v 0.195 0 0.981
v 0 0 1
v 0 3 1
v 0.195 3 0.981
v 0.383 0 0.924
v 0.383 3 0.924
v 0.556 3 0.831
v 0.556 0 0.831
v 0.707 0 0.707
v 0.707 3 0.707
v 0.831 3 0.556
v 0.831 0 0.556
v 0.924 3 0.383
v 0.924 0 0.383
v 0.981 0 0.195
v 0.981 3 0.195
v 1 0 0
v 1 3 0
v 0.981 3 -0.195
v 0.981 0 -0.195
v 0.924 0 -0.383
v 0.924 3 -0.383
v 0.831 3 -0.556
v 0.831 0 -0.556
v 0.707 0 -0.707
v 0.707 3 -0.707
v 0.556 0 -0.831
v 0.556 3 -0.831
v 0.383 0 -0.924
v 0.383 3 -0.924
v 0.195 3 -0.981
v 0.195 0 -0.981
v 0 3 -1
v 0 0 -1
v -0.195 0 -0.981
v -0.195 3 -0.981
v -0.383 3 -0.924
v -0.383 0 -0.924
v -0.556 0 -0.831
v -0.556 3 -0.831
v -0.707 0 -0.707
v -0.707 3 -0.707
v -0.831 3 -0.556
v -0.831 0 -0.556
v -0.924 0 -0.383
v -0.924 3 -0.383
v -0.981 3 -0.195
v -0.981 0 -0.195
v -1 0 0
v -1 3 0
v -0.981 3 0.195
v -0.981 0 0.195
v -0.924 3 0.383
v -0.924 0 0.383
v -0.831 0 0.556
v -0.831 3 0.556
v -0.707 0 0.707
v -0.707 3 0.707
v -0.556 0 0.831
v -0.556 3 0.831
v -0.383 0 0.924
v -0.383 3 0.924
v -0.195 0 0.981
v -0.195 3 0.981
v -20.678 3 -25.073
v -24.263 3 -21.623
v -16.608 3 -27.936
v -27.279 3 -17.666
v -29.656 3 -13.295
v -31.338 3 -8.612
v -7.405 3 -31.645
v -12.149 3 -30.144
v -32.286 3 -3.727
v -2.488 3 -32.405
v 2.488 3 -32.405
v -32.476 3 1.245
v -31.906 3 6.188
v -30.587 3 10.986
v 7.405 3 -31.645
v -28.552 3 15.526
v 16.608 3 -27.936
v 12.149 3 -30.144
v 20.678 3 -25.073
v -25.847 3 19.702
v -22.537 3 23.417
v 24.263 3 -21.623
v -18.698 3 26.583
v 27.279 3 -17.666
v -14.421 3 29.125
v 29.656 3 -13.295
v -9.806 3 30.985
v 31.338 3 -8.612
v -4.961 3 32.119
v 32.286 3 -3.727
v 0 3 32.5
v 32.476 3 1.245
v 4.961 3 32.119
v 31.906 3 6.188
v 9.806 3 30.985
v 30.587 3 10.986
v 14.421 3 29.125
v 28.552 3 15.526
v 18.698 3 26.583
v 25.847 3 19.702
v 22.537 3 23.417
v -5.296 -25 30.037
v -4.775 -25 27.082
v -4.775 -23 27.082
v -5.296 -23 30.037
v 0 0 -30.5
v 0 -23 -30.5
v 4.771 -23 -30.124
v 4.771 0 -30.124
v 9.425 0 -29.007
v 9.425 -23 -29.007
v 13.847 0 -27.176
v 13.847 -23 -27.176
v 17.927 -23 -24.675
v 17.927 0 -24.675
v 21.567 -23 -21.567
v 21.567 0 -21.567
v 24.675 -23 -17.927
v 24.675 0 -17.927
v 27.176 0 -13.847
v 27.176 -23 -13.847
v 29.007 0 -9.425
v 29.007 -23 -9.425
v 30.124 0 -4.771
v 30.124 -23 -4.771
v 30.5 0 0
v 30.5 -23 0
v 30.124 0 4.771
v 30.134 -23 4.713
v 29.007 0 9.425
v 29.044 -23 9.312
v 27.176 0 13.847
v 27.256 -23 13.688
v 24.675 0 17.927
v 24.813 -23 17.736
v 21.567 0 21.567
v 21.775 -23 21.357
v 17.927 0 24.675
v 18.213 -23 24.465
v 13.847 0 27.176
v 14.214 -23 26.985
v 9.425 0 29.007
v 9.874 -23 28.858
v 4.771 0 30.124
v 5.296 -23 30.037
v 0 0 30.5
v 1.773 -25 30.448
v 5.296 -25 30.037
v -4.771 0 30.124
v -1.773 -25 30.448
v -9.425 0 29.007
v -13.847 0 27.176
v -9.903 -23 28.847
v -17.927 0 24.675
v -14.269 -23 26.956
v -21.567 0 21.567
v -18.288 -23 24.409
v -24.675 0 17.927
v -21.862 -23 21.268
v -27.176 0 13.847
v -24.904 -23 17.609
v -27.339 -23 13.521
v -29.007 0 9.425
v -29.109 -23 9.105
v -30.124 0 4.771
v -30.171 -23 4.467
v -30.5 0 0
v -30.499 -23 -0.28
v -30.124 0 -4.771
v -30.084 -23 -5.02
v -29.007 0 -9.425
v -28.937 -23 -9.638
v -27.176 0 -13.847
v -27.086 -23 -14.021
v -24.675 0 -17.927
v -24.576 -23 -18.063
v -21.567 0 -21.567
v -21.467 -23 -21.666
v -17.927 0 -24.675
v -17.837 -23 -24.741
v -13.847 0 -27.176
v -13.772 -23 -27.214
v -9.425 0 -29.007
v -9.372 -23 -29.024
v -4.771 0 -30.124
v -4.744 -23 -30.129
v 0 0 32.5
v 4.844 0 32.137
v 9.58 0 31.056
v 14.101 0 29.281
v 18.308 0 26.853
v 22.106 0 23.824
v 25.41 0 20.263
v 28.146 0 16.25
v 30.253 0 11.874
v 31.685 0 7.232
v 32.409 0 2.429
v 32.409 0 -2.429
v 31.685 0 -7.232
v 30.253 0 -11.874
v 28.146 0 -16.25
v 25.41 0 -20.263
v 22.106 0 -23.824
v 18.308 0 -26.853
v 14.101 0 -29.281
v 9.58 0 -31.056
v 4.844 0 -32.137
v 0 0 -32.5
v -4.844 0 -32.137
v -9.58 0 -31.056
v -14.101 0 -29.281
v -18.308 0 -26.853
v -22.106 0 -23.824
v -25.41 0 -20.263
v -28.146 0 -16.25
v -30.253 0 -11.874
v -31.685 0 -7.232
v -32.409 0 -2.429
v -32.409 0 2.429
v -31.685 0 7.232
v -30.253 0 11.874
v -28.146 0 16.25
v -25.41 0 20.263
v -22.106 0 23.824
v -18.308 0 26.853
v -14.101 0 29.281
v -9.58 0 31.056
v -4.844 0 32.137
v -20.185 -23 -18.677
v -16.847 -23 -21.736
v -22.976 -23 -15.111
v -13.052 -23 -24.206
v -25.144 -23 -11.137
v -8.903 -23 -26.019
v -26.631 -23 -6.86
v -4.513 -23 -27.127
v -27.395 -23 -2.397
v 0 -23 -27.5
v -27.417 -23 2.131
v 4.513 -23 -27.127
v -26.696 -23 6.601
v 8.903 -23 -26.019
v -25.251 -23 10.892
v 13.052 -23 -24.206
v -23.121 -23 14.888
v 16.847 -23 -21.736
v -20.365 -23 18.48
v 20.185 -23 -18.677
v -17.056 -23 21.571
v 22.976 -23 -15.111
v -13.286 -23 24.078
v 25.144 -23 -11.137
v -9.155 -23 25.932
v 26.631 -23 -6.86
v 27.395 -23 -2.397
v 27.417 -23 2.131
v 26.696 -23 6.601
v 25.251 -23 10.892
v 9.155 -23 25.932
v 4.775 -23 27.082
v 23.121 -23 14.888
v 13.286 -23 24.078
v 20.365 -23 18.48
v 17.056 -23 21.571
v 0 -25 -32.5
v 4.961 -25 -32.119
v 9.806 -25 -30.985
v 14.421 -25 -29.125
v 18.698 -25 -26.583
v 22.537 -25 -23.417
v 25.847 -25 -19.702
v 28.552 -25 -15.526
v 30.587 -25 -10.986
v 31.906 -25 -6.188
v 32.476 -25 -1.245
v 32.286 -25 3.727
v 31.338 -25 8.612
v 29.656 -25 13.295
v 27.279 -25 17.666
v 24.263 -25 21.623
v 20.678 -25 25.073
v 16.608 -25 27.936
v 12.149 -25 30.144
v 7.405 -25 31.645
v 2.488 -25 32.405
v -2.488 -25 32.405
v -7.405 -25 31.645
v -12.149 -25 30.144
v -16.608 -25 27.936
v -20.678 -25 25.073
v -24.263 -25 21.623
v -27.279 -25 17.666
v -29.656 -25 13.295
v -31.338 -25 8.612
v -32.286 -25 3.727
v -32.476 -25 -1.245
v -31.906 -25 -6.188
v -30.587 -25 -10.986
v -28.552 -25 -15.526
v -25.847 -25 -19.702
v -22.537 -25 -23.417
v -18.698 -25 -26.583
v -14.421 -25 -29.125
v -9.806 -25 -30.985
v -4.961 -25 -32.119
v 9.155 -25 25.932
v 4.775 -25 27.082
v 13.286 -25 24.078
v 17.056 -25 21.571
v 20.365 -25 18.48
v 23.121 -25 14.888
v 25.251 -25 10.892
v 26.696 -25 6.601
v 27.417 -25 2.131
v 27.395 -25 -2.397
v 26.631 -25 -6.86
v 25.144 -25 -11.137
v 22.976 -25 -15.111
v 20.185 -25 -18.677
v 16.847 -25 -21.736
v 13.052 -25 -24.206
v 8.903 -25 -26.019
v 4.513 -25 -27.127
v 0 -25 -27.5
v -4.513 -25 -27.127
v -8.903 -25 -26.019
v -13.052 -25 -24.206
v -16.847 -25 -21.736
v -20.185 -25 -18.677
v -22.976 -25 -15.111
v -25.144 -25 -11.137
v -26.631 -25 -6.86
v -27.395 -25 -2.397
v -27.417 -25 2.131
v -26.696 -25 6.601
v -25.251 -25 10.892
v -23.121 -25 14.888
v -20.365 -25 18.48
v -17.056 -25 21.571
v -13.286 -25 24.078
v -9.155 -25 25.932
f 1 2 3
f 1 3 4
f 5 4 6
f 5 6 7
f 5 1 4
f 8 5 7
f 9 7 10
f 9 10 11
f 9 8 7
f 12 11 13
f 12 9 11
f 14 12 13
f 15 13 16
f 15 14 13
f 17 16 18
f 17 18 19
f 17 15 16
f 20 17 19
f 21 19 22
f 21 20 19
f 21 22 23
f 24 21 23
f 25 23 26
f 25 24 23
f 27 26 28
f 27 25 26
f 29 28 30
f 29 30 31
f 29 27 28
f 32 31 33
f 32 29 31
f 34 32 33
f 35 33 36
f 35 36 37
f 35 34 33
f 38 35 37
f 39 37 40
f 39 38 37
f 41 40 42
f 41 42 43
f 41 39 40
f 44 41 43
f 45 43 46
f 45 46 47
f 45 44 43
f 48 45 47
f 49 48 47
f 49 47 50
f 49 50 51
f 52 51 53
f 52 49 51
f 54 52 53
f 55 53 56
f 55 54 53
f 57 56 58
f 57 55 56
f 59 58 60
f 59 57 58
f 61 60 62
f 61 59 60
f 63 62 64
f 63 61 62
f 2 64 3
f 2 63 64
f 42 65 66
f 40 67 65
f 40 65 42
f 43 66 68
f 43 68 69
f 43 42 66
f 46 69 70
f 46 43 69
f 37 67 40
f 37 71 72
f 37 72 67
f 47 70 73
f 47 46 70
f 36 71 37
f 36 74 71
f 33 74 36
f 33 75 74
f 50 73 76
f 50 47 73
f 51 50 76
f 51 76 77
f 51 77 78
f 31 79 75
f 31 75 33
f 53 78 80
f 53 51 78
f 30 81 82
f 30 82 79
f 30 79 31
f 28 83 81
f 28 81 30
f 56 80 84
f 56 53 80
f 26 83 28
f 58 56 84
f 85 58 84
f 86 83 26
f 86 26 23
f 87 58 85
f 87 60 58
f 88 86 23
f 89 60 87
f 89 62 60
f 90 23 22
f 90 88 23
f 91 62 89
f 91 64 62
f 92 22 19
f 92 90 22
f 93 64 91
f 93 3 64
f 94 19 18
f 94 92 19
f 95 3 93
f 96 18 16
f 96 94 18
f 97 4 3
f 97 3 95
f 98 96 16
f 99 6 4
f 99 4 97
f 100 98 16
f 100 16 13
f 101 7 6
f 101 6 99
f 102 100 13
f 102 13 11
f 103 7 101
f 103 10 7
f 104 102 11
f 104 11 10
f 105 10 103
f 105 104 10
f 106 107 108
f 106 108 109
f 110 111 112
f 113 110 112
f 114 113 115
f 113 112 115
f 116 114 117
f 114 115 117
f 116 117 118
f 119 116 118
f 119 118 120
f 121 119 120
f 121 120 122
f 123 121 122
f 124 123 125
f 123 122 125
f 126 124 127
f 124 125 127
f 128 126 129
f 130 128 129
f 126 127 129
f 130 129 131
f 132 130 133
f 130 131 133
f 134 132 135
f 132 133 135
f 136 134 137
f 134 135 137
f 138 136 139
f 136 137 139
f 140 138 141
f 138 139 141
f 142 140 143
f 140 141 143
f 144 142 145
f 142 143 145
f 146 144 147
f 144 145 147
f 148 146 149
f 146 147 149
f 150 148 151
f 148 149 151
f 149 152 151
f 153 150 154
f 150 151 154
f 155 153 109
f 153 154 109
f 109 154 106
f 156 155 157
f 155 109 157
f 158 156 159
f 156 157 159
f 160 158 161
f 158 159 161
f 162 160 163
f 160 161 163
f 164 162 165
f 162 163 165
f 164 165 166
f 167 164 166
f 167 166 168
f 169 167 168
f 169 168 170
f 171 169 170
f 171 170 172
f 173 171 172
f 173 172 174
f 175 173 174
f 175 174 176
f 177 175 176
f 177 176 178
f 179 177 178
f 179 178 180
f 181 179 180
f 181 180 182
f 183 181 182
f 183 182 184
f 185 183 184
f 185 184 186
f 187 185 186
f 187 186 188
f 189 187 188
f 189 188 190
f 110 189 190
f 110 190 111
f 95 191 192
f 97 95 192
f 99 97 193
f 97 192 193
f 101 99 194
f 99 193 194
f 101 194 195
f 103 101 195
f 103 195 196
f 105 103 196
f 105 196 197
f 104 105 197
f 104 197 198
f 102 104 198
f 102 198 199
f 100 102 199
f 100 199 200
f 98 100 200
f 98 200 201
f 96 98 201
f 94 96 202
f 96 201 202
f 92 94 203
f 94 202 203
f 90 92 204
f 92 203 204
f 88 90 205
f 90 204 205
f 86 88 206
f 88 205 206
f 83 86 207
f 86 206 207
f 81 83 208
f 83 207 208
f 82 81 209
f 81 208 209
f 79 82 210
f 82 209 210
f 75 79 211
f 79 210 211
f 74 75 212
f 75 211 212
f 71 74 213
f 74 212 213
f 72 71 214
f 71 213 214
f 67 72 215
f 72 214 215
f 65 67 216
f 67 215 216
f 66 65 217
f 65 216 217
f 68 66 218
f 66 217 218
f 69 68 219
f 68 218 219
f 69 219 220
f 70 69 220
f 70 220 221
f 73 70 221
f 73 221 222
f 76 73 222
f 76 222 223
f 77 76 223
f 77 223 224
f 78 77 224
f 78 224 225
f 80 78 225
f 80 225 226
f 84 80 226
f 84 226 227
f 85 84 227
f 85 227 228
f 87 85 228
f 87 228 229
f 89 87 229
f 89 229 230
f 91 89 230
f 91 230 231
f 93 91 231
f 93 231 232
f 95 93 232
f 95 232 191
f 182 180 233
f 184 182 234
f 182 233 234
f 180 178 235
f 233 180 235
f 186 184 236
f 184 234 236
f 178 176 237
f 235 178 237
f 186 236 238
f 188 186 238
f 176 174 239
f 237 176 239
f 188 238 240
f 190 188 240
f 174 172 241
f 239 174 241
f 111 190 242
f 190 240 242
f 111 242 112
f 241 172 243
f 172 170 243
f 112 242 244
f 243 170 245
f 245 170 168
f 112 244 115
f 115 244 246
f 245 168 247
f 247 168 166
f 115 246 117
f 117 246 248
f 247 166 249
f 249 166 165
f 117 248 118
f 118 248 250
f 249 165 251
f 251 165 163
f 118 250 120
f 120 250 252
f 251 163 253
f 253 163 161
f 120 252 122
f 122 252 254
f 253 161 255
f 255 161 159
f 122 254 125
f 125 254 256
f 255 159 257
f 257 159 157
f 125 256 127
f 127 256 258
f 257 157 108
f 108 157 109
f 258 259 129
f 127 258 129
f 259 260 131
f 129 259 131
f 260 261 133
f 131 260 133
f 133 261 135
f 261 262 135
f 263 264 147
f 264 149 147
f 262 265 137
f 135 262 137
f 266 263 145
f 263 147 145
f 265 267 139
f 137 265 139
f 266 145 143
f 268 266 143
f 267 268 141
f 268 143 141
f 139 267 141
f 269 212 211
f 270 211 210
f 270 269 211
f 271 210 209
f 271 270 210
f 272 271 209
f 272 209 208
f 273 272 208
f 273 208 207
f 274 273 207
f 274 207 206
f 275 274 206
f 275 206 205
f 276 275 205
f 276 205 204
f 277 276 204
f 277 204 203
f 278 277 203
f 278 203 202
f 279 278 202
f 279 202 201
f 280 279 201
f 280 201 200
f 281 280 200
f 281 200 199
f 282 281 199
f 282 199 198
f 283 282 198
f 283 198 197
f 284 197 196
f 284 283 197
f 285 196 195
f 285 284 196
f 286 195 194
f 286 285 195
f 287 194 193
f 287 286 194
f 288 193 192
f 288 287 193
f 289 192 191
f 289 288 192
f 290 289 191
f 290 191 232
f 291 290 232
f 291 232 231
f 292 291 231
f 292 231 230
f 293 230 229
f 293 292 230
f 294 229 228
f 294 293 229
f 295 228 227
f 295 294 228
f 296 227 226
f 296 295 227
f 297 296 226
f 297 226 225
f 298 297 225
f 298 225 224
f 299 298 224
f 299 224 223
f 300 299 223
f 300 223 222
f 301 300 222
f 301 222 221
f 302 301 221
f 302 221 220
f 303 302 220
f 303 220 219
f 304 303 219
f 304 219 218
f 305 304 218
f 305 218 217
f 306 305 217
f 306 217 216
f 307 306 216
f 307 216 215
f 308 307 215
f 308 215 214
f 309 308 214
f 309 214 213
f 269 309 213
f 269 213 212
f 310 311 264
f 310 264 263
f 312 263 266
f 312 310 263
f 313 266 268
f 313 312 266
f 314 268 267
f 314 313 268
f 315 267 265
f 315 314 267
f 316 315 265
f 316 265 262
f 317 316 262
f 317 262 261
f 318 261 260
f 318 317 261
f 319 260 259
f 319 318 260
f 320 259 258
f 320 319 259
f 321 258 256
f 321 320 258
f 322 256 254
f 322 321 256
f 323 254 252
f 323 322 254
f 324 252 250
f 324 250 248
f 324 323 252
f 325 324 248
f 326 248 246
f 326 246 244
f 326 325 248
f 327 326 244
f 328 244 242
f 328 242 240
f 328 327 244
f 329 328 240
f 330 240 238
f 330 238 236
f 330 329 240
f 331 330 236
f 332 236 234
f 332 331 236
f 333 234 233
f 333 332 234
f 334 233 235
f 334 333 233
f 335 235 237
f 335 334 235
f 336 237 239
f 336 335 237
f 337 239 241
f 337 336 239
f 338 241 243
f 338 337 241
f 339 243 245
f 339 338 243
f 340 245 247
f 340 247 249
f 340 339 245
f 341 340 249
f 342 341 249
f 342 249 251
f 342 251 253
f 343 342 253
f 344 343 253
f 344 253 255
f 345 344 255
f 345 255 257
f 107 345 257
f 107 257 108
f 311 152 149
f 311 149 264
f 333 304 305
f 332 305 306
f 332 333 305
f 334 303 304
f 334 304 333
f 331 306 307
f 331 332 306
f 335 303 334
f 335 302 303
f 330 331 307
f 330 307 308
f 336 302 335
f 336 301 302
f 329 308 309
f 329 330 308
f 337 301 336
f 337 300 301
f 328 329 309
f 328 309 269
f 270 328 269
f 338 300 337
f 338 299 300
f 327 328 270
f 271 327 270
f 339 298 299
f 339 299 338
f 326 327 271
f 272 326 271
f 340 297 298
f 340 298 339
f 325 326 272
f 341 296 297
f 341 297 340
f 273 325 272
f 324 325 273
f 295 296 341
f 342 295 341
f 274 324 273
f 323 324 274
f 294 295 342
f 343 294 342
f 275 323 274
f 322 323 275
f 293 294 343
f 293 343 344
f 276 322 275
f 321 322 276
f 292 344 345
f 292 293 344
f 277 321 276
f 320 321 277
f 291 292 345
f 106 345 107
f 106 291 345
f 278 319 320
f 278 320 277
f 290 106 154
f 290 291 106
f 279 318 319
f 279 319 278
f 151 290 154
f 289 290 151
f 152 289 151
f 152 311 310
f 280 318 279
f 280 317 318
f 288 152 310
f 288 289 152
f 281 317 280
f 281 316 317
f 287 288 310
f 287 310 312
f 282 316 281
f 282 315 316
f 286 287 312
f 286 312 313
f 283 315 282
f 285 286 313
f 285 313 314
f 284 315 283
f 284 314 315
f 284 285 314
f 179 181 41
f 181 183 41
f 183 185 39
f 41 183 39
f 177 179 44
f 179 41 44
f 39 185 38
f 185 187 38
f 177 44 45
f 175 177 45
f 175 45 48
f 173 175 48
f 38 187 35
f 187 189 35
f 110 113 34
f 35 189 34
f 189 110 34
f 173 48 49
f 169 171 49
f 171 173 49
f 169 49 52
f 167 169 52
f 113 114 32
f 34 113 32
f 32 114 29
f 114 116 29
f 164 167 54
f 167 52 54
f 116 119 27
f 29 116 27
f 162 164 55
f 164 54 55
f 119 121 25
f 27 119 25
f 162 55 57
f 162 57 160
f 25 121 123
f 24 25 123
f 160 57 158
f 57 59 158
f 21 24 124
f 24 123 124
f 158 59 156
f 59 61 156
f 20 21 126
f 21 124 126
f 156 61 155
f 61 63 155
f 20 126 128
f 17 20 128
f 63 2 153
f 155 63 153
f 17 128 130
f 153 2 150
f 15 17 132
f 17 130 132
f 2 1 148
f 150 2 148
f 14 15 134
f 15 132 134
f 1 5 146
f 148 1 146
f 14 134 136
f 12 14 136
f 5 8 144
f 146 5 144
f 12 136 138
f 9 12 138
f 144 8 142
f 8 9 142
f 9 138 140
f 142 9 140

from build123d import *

# Parameters (mm, degrees)
SKETCH1_R           = 32.5
SKETCH1_R_2         = 1
BOSS_EXTRUDE1_DEPTH = 3
BOSS_EXTRUDE2_START = 25
SKETCH3_R           = 32.5
SKETCH3_R_2         = 30.5
BOSS_EXTRUDE2_DEPTH = 25
BOSS_EXTRUDE3_DEPTH = 2


with BuildPart() as part:
    # Sketch1 → Boss-Extrude1 (new body)
    with BuildSketch(Plane(origin=(0, 0, 0), x_dir=(1, 0, 0), z_dir=(0, 1, 0))):
        with Locations(Location((0, 0, 0), (0, 0, 270))):
            Circle(SKETCH1_R)
        with Locations(Location((0, 0, 0), (0, 0, 270))):
            Circle(SKETCH1_R_2, mode=Mode.SUBTRACT)
    extrude(amount=BOSS_EXTRUDE1_DEPTH)

    # Sketch3 → Boss-Extrude2 (add)
    with BuildSketch(Plane.XZ.offset(BOSS_EXTRUDE2_START)):
        with Locations(Location((0, 0, 0), (0, 0, 270))):
            Circle(SKETCH3_R)
        with Locations(Location((0, 0, 0), (0, 0, 270))):
            Circle(SKETCH3_R_2, mode=Mode.SUBTRACT)
    extrude(amount=-BOSS_EXTRUDE2_DEPTH)

    # Sketch7 → Boss-Extrude3 (add)
    with BuildSketch(Plane.XZ.offset(25)):
        with BuildLine():
            ThreePointArc((4.775324886, 27.082213208), (0, -27.5), (-4.775324886, 27.082213208))
            Line((-4.775324886, 27.082213208), (-5.296269419, 30.036636467))
            ThreePointArc((-5.296269419, 30.036636467), (-19.605022095, -23.364355515), (30.5, 0))
            ThreePointArc((30.5, 0), (23.364355515, 19.605022095), (5.296269419, 30.036636467))
            Line((5.296269419, 30.036636467), (4.775324886, 27.082213208))
        make_face()
    extrude(amount=-BOSS_EXTRUDE3_DEPTH)


solid = part.part
